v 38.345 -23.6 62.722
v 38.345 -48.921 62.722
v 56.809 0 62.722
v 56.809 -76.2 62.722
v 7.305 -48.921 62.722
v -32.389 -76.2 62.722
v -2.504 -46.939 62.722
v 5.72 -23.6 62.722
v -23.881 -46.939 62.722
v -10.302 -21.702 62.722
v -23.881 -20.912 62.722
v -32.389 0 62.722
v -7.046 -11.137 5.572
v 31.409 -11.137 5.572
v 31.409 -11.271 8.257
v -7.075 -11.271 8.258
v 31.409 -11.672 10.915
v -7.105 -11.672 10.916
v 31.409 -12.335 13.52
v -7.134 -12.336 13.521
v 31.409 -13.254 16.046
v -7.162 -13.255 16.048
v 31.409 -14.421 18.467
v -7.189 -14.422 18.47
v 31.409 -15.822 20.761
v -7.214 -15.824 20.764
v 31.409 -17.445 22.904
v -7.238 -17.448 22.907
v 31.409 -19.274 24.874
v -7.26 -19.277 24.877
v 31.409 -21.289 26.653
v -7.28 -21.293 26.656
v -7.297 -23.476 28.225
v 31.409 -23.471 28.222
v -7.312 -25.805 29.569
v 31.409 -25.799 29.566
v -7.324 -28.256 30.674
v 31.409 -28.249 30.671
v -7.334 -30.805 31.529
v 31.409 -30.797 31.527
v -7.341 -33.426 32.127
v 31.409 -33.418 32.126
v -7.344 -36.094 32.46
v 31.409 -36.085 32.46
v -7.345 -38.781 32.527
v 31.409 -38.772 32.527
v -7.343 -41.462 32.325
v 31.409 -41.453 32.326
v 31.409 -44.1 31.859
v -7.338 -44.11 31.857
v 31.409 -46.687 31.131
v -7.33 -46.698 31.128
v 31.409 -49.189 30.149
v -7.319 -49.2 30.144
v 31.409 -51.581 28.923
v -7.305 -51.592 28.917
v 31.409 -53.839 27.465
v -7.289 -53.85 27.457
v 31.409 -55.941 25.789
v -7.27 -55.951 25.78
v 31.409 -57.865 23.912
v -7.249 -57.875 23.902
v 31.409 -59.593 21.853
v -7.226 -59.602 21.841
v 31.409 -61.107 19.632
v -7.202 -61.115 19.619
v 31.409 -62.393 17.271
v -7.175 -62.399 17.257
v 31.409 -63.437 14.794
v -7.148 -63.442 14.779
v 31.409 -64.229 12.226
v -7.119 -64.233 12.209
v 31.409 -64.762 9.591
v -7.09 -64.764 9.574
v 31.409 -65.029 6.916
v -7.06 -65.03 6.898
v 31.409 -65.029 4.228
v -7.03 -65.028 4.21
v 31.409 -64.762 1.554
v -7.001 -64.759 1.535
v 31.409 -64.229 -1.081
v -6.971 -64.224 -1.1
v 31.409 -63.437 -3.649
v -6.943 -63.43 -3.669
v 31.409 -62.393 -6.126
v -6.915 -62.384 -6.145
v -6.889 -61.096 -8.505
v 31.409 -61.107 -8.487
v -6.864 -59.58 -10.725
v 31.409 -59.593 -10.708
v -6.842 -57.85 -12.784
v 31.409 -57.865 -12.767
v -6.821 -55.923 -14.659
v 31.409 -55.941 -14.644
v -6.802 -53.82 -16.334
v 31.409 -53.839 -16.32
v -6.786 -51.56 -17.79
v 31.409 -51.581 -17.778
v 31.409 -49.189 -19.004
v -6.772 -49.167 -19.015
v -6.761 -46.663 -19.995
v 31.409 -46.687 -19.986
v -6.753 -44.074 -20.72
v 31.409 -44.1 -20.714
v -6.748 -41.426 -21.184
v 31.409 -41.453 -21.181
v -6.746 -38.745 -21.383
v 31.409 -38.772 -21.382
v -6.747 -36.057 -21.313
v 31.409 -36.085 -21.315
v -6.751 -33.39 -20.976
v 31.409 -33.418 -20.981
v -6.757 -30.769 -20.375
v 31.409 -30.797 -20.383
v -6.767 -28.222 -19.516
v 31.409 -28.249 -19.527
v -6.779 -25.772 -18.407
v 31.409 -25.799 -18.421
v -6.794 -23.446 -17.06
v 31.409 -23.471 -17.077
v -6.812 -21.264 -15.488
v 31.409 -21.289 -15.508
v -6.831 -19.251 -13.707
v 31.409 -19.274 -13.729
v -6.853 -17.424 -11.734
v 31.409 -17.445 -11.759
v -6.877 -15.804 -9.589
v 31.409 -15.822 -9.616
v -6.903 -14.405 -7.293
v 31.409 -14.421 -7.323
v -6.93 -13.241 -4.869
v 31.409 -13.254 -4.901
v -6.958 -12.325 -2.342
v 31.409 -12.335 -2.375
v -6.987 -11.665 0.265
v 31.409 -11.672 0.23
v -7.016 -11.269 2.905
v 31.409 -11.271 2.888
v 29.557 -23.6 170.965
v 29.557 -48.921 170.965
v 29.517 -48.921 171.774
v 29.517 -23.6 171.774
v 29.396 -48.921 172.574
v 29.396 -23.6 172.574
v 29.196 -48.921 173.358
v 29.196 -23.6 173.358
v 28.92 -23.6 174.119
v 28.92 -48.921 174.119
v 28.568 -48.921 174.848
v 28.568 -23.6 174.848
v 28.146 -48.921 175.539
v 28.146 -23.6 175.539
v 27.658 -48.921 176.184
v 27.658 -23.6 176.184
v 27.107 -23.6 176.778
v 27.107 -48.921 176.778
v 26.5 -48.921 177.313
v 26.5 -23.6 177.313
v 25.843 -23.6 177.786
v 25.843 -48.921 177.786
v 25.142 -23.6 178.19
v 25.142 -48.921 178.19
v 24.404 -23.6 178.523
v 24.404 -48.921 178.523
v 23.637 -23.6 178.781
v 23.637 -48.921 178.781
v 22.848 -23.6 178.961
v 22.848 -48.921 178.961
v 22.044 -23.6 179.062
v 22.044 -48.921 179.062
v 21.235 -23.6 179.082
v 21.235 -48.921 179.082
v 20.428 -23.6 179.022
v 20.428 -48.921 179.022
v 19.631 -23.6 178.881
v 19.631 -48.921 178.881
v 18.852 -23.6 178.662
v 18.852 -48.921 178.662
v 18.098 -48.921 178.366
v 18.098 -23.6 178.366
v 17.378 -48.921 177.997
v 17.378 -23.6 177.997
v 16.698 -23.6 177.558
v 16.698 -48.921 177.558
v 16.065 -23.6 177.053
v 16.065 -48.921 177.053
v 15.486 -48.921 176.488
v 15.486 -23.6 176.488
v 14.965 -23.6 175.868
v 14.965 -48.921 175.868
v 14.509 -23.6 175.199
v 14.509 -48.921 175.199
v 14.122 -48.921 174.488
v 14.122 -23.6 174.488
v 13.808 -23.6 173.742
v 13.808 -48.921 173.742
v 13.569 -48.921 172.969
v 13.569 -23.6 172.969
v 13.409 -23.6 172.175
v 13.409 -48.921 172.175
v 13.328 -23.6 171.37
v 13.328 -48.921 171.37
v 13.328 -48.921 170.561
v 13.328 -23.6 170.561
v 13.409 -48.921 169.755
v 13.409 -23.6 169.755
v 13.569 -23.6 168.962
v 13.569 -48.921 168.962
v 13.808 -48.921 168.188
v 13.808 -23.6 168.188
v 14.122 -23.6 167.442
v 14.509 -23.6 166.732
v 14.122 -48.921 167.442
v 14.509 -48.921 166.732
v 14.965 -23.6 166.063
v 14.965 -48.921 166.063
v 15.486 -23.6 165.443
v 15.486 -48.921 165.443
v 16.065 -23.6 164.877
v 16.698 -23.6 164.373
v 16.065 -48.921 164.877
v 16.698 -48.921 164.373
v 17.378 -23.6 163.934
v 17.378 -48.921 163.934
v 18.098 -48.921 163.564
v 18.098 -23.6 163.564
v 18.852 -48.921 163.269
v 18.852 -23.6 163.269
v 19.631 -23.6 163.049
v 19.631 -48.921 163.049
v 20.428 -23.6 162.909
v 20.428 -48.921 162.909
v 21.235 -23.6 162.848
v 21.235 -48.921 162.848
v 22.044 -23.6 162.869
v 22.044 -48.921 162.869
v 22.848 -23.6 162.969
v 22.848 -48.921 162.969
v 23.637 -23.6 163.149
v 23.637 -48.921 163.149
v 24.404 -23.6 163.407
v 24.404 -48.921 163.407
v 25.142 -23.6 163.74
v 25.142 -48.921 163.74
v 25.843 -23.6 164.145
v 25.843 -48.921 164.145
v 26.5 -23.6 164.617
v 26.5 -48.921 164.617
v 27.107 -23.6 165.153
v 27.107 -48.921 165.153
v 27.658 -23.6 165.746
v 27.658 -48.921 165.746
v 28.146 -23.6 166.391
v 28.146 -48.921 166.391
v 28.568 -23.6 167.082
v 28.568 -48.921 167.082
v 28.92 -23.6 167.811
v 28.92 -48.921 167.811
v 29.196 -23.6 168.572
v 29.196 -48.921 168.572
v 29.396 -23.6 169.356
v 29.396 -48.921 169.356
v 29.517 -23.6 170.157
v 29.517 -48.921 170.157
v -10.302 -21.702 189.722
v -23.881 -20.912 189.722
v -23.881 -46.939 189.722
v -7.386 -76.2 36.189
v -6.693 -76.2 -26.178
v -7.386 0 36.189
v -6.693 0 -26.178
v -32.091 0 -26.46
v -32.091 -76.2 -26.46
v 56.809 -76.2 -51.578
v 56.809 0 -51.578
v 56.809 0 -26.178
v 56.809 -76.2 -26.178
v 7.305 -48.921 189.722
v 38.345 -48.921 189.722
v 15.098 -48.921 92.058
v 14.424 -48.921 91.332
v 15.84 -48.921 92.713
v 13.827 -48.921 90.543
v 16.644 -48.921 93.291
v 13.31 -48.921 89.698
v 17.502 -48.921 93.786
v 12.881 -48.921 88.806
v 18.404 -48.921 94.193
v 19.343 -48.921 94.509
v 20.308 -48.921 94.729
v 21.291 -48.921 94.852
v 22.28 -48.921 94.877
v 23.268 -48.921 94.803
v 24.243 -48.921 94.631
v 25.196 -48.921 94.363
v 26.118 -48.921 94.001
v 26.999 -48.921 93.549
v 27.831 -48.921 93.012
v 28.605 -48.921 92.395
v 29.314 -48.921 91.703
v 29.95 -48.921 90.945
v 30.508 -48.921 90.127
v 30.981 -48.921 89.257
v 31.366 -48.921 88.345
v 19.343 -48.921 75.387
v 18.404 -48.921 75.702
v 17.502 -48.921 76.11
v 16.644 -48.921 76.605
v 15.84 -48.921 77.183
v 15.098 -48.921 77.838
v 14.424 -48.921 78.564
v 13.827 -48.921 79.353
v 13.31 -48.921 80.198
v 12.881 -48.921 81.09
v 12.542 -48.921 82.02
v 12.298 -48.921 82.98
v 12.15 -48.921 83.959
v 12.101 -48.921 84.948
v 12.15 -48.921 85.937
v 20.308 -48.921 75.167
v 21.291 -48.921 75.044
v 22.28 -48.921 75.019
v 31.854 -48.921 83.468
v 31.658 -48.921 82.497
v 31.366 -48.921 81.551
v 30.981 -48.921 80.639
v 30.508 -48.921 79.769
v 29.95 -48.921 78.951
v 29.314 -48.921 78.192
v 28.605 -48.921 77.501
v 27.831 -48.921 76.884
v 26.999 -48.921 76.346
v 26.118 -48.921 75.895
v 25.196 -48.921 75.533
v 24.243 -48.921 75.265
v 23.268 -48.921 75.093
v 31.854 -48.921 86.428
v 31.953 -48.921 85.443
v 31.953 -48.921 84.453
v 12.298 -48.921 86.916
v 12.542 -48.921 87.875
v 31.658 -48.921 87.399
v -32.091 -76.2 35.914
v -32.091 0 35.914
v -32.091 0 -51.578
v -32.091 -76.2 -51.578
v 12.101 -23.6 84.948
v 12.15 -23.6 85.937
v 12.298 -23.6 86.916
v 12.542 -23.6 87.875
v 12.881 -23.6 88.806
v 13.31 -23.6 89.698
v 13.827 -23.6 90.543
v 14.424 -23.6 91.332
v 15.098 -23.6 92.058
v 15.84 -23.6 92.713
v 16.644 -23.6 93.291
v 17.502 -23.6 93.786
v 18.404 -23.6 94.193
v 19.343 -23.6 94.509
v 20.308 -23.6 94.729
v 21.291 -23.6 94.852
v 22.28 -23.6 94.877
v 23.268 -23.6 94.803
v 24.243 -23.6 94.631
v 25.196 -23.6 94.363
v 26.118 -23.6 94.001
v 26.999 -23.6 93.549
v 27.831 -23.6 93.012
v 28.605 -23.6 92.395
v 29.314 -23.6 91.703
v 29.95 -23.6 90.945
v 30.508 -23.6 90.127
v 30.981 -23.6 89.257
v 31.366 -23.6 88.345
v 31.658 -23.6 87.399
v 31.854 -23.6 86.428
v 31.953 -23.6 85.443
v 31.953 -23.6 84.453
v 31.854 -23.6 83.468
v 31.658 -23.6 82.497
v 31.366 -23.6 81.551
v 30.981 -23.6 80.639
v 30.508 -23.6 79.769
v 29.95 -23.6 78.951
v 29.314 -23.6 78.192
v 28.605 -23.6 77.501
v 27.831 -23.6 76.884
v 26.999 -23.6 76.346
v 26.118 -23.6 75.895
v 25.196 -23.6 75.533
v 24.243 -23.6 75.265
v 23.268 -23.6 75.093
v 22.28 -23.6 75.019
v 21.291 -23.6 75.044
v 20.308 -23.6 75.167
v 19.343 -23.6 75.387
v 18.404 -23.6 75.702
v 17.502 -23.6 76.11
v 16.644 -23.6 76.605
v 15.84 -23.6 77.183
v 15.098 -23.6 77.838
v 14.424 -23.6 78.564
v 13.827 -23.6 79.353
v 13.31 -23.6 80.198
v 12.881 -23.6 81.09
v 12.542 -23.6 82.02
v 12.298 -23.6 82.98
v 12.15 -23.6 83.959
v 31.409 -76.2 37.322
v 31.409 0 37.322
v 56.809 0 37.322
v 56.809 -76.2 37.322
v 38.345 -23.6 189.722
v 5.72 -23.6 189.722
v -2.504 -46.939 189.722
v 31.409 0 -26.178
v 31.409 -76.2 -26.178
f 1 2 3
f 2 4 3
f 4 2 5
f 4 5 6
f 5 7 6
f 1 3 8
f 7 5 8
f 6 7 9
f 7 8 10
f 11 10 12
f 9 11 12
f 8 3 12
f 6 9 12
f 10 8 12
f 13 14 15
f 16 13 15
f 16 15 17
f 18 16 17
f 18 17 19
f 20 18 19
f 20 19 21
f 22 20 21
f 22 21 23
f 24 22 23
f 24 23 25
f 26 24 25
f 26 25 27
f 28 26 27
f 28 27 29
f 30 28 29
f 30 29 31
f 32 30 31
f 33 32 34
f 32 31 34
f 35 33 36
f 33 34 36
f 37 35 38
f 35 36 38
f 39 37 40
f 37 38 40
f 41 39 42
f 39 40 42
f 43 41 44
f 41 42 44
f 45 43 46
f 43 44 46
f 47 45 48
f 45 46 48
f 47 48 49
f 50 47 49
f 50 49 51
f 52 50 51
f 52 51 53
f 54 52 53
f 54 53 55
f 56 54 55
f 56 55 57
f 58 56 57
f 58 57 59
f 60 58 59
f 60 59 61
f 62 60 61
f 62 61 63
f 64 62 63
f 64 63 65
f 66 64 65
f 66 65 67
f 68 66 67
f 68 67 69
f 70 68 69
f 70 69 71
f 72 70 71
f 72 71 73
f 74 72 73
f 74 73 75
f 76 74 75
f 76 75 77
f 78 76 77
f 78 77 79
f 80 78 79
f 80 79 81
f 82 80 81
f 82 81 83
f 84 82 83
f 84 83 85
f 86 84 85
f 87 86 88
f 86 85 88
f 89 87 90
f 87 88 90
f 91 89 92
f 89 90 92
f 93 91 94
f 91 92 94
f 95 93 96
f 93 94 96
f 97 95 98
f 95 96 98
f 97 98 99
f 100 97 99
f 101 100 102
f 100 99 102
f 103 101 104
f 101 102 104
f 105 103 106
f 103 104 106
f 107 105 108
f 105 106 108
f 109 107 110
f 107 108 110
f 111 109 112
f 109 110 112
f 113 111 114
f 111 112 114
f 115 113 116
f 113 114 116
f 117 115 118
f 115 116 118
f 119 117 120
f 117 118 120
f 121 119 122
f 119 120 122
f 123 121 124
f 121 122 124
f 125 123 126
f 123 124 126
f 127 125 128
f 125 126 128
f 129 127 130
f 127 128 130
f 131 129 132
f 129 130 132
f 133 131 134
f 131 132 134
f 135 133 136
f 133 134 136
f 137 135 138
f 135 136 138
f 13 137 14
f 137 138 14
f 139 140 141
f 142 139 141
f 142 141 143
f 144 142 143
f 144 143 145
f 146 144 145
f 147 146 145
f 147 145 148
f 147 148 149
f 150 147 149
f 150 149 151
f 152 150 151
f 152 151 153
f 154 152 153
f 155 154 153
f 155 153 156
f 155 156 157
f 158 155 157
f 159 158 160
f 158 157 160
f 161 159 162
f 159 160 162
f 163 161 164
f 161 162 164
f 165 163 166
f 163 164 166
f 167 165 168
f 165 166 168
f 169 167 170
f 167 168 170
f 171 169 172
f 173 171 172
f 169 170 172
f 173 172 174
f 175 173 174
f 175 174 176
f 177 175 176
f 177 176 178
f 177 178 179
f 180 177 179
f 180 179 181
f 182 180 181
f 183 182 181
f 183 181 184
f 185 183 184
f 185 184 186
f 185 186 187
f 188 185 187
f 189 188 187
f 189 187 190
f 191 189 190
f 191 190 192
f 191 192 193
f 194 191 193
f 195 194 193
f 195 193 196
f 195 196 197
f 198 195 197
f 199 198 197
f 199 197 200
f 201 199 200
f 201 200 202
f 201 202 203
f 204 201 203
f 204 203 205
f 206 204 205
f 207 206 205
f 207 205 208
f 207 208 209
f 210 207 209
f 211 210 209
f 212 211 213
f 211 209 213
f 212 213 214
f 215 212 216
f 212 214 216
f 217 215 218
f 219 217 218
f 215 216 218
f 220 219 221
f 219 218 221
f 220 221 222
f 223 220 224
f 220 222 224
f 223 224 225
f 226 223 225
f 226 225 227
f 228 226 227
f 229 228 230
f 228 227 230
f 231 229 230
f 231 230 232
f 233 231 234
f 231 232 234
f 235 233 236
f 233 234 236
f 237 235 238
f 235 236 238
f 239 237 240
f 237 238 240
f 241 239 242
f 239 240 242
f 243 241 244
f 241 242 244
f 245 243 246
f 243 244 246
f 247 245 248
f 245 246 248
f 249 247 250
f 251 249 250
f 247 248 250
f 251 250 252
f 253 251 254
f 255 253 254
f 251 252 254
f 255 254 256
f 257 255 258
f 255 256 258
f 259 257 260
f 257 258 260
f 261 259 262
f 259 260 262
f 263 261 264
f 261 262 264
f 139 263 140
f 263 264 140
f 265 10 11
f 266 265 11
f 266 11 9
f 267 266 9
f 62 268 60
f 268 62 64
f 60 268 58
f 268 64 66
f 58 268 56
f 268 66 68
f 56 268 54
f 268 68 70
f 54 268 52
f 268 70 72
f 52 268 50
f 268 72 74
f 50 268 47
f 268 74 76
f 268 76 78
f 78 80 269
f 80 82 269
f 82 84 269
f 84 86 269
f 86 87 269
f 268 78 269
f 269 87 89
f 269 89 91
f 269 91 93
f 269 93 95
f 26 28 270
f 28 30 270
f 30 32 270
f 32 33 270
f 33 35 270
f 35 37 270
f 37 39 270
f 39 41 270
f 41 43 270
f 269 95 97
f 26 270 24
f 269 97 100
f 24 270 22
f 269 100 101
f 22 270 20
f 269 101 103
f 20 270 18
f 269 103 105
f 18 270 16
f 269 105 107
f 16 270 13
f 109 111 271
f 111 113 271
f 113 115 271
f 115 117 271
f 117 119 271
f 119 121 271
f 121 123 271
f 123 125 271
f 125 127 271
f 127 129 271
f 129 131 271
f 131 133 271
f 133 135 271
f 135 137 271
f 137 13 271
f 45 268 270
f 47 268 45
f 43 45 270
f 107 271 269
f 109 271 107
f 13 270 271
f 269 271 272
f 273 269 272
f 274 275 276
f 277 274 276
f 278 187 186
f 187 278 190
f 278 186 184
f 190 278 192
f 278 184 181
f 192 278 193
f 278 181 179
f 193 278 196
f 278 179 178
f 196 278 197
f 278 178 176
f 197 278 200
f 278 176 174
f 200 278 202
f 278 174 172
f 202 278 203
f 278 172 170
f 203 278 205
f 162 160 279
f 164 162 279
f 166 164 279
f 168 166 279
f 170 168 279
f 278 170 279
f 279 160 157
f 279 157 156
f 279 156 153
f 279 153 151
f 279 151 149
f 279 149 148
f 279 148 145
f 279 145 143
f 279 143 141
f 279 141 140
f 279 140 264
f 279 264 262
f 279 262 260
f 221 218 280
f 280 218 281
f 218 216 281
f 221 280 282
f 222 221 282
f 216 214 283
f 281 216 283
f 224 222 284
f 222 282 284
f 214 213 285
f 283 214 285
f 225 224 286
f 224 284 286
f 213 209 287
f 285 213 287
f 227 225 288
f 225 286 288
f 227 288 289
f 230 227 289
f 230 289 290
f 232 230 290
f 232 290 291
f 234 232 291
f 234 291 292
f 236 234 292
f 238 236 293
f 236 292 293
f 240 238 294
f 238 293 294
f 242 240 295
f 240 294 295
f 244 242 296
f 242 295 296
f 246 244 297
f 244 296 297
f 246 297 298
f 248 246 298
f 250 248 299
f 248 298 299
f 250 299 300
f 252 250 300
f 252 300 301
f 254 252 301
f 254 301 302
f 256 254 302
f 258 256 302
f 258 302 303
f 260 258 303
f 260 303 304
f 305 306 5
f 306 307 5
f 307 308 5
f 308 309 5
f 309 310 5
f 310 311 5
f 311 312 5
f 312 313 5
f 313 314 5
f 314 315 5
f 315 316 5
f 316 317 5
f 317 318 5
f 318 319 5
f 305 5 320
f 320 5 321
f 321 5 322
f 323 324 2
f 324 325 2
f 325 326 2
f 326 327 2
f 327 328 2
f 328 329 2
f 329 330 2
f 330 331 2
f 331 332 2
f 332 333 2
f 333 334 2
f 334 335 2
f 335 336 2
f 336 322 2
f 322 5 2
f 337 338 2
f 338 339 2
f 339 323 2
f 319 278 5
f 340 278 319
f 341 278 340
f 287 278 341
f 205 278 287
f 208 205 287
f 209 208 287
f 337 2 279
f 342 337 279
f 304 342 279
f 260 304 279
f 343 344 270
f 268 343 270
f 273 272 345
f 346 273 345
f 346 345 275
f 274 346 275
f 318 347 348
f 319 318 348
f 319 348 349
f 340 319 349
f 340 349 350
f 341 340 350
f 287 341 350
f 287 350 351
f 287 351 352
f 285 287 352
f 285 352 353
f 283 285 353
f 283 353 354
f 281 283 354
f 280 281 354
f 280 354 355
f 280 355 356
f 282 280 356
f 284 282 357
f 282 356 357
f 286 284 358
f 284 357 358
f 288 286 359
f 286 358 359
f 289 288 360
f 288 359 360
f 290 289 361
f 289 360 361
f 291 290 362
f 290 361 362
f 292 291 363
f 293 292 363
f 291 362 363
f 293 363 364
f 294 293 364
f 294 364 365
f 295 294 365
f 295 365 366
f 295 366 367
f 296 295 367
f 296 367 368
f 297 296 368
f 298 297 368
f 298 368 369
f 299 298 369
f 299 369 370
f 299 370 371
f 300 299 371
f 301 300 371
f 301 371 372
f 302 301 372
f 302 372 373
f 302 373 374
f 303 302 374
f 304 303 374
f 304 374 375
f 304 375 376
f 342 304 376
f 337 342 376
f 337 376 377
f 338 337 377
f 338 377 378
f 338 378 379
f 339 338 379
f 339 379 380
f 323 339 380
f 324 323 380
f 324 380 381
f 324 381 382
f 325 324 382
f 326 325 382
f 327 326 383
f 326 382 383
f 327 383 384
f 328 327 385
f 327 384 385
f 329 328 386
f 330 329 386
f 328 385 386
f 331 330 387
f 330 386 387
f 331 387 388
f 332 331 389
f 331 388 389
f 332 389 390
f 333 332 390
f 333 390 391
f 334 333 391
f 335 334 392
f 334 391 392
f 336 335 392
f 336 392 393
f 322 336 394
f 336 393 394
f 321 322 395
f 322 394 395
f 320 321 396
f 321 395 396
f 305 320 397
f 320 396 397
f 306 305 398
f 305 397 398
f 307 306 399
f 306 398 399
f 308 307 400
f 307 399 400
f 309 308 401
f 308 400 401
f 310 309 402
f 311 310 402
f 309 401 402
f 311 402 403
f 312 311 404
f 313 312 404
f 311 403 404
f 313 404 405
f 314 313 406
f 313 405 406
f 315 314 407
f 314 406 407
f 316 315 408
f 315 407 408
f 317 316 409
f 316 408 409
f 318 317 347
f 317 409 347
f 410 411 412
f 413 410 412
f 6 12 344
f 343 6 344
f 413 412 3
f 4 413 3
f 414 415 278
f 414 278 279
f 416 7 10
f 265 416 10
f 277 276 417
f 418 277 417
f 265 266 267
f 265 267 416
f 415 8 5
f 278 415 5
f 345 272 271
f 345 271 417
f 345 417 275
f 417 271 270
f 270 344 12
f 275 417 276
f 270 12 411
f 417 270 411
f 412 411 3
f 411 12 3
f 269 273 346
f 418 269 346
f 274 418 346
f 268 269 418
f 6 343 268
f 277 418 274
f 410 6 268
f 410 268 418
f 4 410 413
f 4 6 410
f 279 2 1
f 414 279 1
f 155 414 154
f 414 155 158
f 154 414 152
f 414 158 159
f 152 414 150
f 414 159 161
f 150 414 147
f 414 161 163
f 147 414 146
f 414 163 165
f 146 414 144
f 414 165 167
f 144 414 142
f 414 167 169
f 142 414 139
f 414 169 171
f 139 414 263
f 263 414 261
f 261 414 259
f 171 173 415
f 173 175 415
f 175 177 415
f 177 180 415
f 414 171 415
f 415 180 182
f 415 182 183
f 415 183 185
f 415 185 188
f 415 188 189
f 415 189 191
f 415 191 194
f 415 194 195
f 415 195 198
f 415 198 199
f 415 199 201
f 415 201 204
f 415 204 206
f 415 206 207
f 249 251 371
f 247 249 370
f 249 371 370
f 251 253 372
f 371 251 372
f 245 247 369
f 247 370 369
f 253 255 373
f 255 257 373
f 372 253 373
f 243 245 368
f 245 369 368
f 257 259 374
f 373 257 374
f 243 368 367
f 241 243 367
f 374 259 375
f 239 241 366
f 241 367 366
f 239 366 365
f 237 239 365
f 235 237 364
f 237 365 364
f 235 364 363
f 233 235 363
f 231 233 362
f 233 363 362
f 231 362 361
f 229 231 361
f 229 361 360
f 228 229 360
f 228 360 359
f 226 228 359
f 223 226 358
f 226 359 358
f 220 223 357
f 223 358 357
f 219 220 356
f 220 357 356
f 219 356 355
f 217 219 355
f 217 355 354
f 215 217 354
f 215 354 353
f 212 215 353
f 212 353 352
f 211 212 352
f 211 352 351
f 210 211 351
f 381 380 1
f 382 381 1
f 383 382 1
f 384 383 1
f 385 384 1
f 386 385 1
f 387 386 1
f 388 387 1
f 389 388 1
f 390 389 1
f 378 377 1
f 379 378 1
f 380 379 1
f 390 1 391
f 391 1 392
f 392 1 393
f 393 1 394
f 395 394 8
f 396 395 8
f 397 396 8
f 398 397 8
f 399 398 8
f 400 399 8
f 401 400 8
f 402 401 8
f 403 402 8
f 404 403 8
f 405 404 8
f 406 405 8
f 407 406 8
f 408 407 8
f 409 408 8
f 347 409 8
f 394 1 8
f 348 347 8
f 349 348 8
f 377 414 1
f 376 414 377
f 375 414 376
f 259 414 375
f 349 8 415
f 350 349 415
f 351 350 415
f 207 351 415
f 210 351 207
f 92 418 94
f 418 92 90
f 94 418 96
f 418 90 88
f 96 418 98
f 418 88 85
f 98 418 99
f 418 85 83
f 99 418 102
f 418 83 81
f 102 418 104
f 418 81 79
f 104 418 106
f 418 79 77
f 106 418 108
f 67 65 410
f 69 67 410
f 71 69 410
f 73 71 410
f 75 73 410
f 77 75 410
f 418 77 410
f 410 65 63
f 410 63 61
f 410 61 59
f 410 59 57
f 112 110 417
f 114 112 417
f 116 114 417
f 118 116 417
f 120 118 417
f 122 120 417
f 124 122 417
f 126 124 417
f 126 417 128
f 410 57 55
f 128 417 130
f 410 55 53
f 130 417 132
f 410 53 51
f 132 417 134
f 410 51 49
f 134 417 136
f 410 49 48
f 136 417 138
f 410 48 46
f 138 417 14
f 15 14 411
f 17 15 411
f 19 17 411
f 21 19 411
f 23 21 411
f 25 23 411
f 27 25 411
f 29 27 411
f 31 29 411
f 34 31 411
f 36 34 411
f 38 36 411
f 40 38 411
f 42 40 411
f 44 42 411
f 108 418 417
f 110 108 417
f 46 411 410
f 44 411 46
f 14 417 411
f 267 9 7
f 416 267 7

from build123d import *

# Parameters (mm, degrees)
F1_DEPTH  = 76.2
F2_R      = 26.962809
F3_DEPTH  = 63.798865
F5_DEPTH  = 127
F7_DEPTH  = 127
F8_R      = 8.119413
F9_DEPTH  = 48.922082
F10_R     = 9.932107
F11_DEPTH = 52.600686


with BuildPart() as f1:
    # F0 (on Front) → F1 (new body)
    with BuildSketch(Plane.XZ):
        Polygon((-32.091218, -26.459824), (-32.091218, -51.57762), (56.808782, -51.57762), (56.808782, -26.17762), (31.408782, -26.17762), (31.408782, 37.32238), (56.808782, 37.32238), (56.808782, 62.72238), (-32.389083, 62.72238), (-32.091218, 35.914471), (-7.385746, 36.188975), (-6.692785, -26.17762), align=None)
    extrude(amount=F1_DEPTH)

    # F2 (on face) → F3 (cut, through all)
    with BuildSketch(Plane.YZ.offset(31.408782)):
        with Locations((-38.1, 5.57238)):
            Circle(F2_R)
    extrude(amount=-F3_DEPTH, mode=Mode.SUBTRACT)

    # F4 (on face) → F5 (join)
    with BuildSketch(Plane.XY.offset(62.72238)):
        Polygon((5.720465, -23.600314), (7.3049, -48.921082), (38.345255, -48.921082), (38.345255, -23.600314), align=None)
    extrude(amount=F5_DEPTH)

    # F6 (on face) → F7 (join)
    with BuildSketch(Plane.XY.offset(62.72238)):
        Polygon((-2.503503, -46.93903), (-10.301619, -21.702323), (-23.880914, -20.912418), (-23.880914, -46.93903), align=None)
    extrude(amount=F7_DEPTH)

    # F8 (on face) → F9 (cut, through all)
    with BuildSketch(Plane.XZ.offset(48.921082)):
        with Locations((21.437701, 170.965254)):
            Circle(F8_R)
    extrude(amount=-F9_DEPTH, mode=Mode.SUBTRACT)

    # F10 (on face) → F11 (cut, through all)
    with BuildSketch(Plane(origin=(0, -23.600314, 0), x_dir=(-1, 0, 0), z_dir=(0, 1, 0))):
        with Locations((-22.03286, 84.947929)):
            Circle(F10_R)
    extrude(amount=-F11_DEPTH, mode=Mode.SUBTRACT)


solid = f1.part
